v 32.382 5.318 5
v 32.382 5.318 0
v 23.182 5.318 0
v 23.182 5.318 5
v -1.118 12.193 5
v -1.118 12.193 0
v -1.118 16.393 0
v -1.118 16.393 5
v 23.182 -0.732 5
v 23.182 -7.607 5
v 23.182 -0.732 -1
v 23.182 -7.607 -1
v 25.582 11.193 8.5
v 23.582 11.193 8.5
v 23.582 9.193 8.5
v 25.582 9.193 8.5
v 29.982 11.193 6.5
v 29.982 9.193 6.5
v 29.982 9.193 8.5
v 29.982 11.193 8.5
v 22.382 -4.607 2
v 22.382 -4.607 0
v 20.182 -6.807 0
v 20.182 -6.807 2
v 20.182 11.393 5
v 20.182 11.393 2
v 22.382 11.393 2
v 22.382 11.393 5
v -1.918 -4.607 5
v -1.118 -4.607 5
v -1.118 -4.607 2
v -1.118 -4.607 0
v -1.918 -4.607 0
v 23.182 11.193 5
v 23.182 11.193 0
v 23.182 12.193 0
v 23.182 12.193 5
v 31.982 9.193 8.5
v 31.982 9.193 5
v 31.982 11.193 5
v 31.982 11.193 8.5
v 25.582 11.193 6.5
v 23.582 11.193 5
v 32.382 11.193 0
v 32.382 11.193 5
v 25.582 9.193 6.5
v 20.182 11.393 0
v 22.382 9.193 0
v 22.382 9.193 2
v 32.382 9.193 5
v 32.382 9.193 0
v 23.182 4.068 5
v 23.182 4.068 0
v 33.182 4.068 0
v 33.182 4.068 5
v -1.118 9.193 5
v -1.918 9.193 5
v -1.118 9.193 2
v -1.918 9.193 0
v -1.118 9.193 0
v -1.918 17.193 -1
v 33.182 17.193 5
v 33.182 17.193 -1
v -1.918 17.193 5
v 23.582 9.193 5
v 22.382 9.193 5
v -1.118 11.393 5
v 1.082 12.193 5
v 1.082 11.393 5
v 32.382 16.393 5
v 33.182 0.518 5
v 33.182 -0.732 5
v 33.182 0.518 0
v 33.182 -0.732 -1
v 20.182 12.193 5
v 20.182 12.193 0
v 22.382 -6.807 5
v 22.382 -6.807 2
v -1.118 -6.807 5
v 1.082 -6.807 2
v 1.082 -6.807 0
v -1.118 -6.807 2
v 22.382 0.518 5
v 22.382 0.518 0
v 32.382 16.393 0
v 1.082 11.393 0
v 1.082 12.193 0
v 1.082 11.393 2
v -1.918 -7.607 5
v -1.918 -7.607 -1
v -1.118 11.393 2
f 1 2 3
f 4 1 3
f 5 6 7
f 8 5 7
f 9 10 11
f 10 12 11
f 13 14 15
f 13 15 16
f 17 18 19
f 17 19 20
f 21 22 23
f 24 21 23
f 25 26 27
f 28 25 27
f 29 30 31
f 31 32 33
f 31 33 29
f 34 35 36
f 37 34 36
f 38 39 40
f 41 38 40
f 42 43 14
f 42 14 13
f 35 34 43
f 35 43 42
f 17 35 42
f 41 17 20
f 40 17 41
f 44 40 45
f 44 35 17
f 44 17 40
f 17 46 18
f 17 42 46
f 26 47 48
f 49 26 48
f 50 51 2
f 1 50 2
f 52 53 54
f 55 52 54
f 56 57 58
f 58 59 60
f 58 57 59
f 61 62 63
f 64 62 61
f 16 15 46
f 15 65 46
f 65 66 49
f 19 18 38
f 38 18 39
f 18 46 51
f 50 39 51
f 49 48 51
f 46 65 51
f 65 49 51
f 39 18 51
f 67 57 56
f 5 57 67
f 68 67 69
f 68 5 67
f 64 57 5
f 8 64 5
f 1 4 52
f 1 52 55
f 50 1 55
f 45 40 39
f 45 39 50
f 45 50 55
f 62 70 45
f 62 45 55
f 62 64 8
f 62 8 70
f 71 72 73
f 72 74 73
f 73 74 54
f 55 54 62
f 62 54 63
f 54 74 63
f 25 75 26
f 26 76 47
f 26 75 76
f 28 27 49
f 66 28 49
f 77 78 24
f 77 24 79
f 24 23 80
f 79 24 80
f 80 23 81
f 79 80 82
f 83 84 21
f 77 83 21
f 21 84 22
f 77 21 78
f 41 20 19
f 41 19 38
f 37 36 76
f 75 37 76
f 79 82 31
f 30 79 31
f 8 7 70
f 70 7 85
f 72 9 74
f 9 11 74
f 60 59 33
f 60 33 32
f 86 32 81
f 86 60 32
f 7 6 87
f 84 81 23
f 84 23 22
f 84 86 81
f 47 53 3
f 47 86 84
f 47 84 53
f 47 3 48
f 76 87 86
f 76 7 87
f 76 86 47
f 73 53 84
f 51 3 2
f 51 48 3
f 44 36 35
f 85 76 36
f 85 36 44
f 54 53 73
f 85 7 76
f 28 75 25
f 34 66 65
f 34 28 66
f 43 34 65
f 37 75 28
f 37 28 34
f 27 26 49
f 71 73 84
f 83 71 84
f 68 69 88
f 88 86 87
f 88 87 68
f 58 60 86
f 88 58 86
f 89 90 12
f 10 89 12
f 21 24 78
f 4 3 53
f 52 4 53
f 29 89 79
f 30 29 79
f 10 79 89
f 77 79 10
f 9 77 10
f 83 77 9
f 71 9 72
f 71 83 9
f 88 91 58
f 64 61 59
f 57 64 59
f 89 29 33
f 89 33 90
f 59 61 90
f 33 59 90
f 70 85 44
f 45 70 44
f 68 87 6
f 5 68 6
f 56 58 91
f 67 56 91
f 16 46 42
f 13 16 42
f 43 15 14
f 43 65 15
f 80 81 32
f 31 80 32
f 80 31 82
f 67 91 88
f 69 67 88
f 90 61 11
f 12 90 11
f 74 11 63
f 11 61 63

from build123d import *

# Parameters (mm, degrees)
F0_W     = 19.1
F0_H     = 0.8
F0_W_2   = 0.8
F0_H_2   = 13.8
F0_W_3   = 2.45
F0_H_3   = 1
F0_H_4   = 2
F0_W_4   = 4.3
F0_H_5   = 3.875
F0_W_5   = 9.2
F0_H_6   = 3.55
F0_H_7   = 1.25
F1_DEPTH = 1
F2_DEPTH = 2
F3_DEPTH = 5
F4_W     = 2
F4_H     = 2
F4_W_2   = 4.4
F5_DEPTH = 1.5
F6_W     = 2
F6_H     = 2
F7_DEPTH = 2


# Not quite as in the source:
# - a feature names something its author has since deleted; it is built from what else it names


with BuildPart() as f1:
    # F0 (on Top) → F1 (new body)
    with BuildSketch(Plane.XY):
        Polygon((-1.9181339439, 9.1929600332), (-1.1181339439, 9.1929600332), (-1.1181339439, 11.3929600332), (1.0818660561, 11.3929600332), (1.0818660561, 12.1929600332), (-1.1181339439, 12.1929600332), (-1.9181339439, 12.1929600332), align=None)
        Polygon((-1.1181339439, 11.3929600332), (-1.1181339439, 9.1929600332), (1.0818660561, 11.3929600332), align=None)
        with Locations((10.6318660561, 11.7929600332)):
            Rectangle(F0_W, F0_H)
        Polygon((1.0818660561, -6.8070399668), (20.1818660561, -6.8070399668), (22.3818660561, -4.6070399668), (22.3818660561, 0.5179600332), (22.3818660561, 9.1929600332), (20.1818660561, 11.3929600332), (1.0818660561, 11.3929600332), (-1.1181339439, 9.1929600332), (-1.1181339439, -4.6070399668), align=None)
        with Locations((-1.5181339439, 2.2929600332)):
            Rectangle(F0_W_2, F0_H_2)
        Polygon((-1.9181339439, -7.6070399668), (1.0818660561, -7.6070399668), (1.0818660561, -6.8070399668), (-1.1181339439, -6.8070399668), (-1.1181339439, -4.6070399668), (-1.9181339439, -4.6070399668), (-1.9181339439, -6.8070399668), align=None)
        Polygon((-1.1181339439, -6.8070399668), (1.0818660561, -6.8070399668), (-1.1181339439, -4.6070399668), align=None)
        with Locations((10.6318660561, -7.2070399668)):
            Rectangle(F0_W, F0_H)
        Polygon((20.1818660561, -7.6070399668), (23.1818660561, -7.6070399668), (23.1818660561, -4.6070399668), (22.3818660561, -4.6070399668), (22.3818660561, -6.8070399668), (20.1818660561, -6.8070399668), align=None)
        Polygon((22.3818660561, -4.6070399668), (20.1818660561, -6.8070399668), (22.3818660561, -6.8070399668), align=None)
        Polygon((22.3818660561, 0.5179600332), (23.1818660561, 0.5179600332), (23.1818660561, 4.0679600332), (23.1818660561, 5.3179600332), (23.1818660561, 9.1929600332), (22.3818660561, 9.1929600332), align=None)
        Polygon((20.1818660561, 11.3929600332), (22.3818660561, 9.1929600332), (22.3818660561, 11.3929600332), align=None)
        Polygon((22.3818660561, 11.3929600332), (22.3818660561, 9.1929600332), (23.1818660561, 9.1929600332), (23.1818660561, 11.1929600332), (23.1818660561, 12.1929600332), (20.1818660561, 12.1929600332), (20.1818660561, 11.3929600332), align=None)
        with Locations((24.4068660561, 11.6929600332)):
            Rectangle(F0_W_3, F0_H_3)
        with Locations((24.4068660561, 10.1929600332)):
            Rectangle(F0_W_3, F0_H_4)
        with Locations((27.7818660561, 10.1929600332)):
            Rectangle(F0_W_4, F0_H_4)
        with Locations((27.7818660561, 11.6929600332)):
            Rectangle(F0_W_4, F0_H_3)
        with Locations((31.1568660561, 7.2554600332)):
            Rectangle(F0_W_3, F0_H_5)
        Polygon((32.3818660561, 9.1929600332), (32.3818660561, 5.3179600332), (33.1818660561, 5.3179600332), (33.1818660561, 12.1929600332), (32.3818660561, 12.1929600332), (32.3818660561, 11.1929600332), align=None)
        with Locations((27.7818660561, 7.2554600332)):
            Rectangle(F0_W_4, F0_H_5)
        with Locations((24.4068660561, 7.2554600332)):
            Rectangle(F0_W_3, F0_H_5)
        Polygon((23.1818660561, 5.3179600332), (23.1818660561, 4.0679600332), (32.3818660561, 4.0679600332), (32.3818660561, 5.3179600332), (29.9318660561, 5.3179600332), (25.6318660561, 5.3179600332), align=None)
        with Locations((27.7818660561, 2.2929600332)):
            Rectangle(F0_W_5, F0_H_6)
        with Locations((27.7818660561, -0.1070399668)):
            Rectangle(F0_W_5, F0_H_7)
        with Locations((32.7818660561, -0.1070399668)):
            Rectangle(F0_W_2, F0_H_7)
        with Locations((32.7818660561, 2.2929600332)):
            Rectangle(F0_W_2, F0_H_6)
        with Locations((32.7818660561, 4.6929600332)):
            Rectangle(F0_W_2, F0_H_7)
        Polygon((-1.9181339439, 17.1929600332), (-1.9181339439, 12.1929600332), (-1.1181339439, 12.1929600332), (-1.1181339439, 16.3929600332), (23.1818660561, 16.3929600332), (25.6318660561, 16.3929600332), (29.9318660561, 16.3929600332), (32.3818660561, 16.3929600332), (32.3818660561, 12.1929600332), (33.1818660561, 12.1929600332), (33.1818660561, 17.1929600332), (29.9318660561, 17.1929600332), (25.6318660561, 17.1929600332), (23.1818660561, 17.1929600332), align=None)
        Polygon((1.0818660561, 12.1929600332), (20.1818660561, 12.1929600332), (23.1818660561, 12.1929600332), (25.6318660561, 12.1929600332), (29.9318660561, 12.1929600332), (32.3818660561, 12.1929600332), (32.3818660561, 16.3929600332), (29.9318660561, 16.3929600332), (25.6318660561, 16.3929600332), (23.1818660561, 16.3929600332), (-1.1181339439, 16.3929600332), (-1.1181339439, 12.1929600332), align=None)
        Polygon((22.3818660561, -4.6070399668), (23.1818660561, -4.6070399668), (23.1818660561, -0.7320399668), (23.1818660561, 0.5179600332), (22.3818660561, 0.5179600332), align=None)
        with Locations((31.1568660561, 10.1929600332)):
            Rectangle(F0_W_3, F0_H_4)
        with Locations((31.1568660561, 11.6929600332)):
            Rectangle(F0_W_3, F0_H_3)
    extrude(amount=-F1_DEPTH)

    # F0 (on Top) → F2 (join)
    with BuildSketch(Plane.XY):
        Polygon((-1.1181339439, -6.8070399668), (1.0818660561, -6.8070399668), (-1.1181339439, -4.6070399668), align=None)
        Polygon((22.3818660561, -4.6070399668), (20.1818660561, -6.8070399668), (22.3818660561, -6.8070399668), align=None)
        Polygon((20.1818660561, 11.3929600332), (22.3818660561, 9.1929600332), (22.3818660561, 11.3929600332), align=None)
        Polygon((-1.1181339439, 11.3929600332), (-1.1181339439, 9.1929600332), (1.0818660561, 11.3929600332), align=None)
    extrude(amount=F2_DEPTH)

    # F0 (on Top) → F3 (join)
    with BuildSketch(Plane.XY):
        Polygon((-1.9181339439, -7.6070399668), (1.0818660561, -7.6070399668), (1.0818660561, -6.8070399668), (-1.1181339439, -6.8070399668), (-1.1181339439, -4.6070399668), (-1.9181339439, -4.6070399668), (-1.9181339439, -6.8070399668), align=None)
        Polygon((-1.9181339439, 9.1929600332), (-1.1181339439, 9.1929600332), (-1.1181339439, 11.3929600332), (1.0818660561, 11.3929600332), (1.0818660561, 12.1929600332), (-1.1181339439, 12.1929600332), (-1.9181339439, 12.1929600332), align=None)
        Polygon((20.1818660561, -7.6070399668), (23.1818660561, -7.6070399668), (23.1818660561, -4.6070399668), (22.3818660561, -4.6070399668), (22.3818660561, -6.8070399668), (20.1818660561, -6.8070399668), align=None)
        Polygon((22.3818660561, 11.3929600332), (22.3818660561, 9.1929600332), (23.1818660561, 9.1929600332), (23.1818660561, 11.1929600332), (23.1818660561, 12.1929600332), (20.1818660561, 12.1929600332), (20.1818660561, 11.3929600332), align=None)
        Polygon((-1.9181339439, 17.1929600332), (-1.9181339439, 12.1929600332), (-1.1181339439, 12.1929600332), (-1.1181339439, 16.3929600332), (23.1818660561, 16.3929600332), (25.6318660561, 16.3929600332), (29.9318660561, 16.3929600332), (32.3818660561, 16.3929600332), (32.3818660561, 12.1929600332), (33.1818660561, 12.1929600332), (33.1818660561, 17.1929600332), (29.9318660561, 17.1929600332), (25.6318660561, 17.1929600332), (23.1818660561, 17.1929600332), align=None)
        Polygon((32.3818660561, 9.1929600332), (32.3818660561, 5.3179600332), (33.1818660561, 5.3179600332), (33.1818660561, 12.1929600332), (32.3818660561, 12.1929600332), (32.3818660561, 11.1929600332), align=None)
        with Locations((32.7818660561, 4.6929600332)):
            Rectangle(F0_W_2, F0_H_7)
        with Locations((32.7818660561, -0.1070399668)):
            Rectangle(F0_W_2, F0_H_7)
        with Locations((27.7818660561, -0.1070399668)):
            Rectangle(F0_W_5, F0_H_7)
        Polygon((22.3818660561, -4.6070399668), (23.1818660561, -4.6070399668), (23.1818660561, -0.7320399668), (23.1818660561, 0.5179600332), (22.3818660561, 0.5179600332), align=None)
        with Locations((27.7818660561, 10.1929600332)):
            Rectangle(F0_W_4, F0_H_4)
        with Locations((24.4068660561, 10.1929600332)):
            Rectangle(F0_W_3, F0_H_4)
        with Locations((31.1568660561, 10.1929600332)):
            Rectangle(F0_W_3, F0_H_4)
        Polygon((23.1818660561, 5.3179600332), (23.1818660561, 4.0679600332), (32.3818660561, 4.0679600332), (32.3818660561, 5.3179600332), (29.9318660561, 5.3179600332), (25.6318660561, 5.3179600332), align=None)
        with Locations((10.6318660561, -7.2070399668)):
            Rectangle(F0_W, F0_H)
    extrude(amount=F3_DEPTH)

    # F4 (on face) → F5 (join)
    with BuildSketch(Plane.XY.offset(5)):
        with Locations((30.9818660561, 10.1929600332)):
            Rectangle(F4_W, F4_H)
        with Locations((24.5818660561, 10.1929600332)):
            Rectangle(F4_W, F4_H)
        with Locations((27.7818660561, 10.1929600332)):
            Rectangle(F4_W_2, F4_H)
    extrude(amount=F5_DEPTH)

    # F6 (on face) → F7 (join)
    with BuildSketch(Plane.XY.offset(6.5)):
        with Locations((24.5818660561, 10.1929600332)):
            Rectangle(F6_W, F6_H)
        with Locations((30.9818660561, 10.1929600332)):
            Rectangle(F6_W, F6_H)
    extrude(amount=F7_DEPTH)


solid = f1.part
